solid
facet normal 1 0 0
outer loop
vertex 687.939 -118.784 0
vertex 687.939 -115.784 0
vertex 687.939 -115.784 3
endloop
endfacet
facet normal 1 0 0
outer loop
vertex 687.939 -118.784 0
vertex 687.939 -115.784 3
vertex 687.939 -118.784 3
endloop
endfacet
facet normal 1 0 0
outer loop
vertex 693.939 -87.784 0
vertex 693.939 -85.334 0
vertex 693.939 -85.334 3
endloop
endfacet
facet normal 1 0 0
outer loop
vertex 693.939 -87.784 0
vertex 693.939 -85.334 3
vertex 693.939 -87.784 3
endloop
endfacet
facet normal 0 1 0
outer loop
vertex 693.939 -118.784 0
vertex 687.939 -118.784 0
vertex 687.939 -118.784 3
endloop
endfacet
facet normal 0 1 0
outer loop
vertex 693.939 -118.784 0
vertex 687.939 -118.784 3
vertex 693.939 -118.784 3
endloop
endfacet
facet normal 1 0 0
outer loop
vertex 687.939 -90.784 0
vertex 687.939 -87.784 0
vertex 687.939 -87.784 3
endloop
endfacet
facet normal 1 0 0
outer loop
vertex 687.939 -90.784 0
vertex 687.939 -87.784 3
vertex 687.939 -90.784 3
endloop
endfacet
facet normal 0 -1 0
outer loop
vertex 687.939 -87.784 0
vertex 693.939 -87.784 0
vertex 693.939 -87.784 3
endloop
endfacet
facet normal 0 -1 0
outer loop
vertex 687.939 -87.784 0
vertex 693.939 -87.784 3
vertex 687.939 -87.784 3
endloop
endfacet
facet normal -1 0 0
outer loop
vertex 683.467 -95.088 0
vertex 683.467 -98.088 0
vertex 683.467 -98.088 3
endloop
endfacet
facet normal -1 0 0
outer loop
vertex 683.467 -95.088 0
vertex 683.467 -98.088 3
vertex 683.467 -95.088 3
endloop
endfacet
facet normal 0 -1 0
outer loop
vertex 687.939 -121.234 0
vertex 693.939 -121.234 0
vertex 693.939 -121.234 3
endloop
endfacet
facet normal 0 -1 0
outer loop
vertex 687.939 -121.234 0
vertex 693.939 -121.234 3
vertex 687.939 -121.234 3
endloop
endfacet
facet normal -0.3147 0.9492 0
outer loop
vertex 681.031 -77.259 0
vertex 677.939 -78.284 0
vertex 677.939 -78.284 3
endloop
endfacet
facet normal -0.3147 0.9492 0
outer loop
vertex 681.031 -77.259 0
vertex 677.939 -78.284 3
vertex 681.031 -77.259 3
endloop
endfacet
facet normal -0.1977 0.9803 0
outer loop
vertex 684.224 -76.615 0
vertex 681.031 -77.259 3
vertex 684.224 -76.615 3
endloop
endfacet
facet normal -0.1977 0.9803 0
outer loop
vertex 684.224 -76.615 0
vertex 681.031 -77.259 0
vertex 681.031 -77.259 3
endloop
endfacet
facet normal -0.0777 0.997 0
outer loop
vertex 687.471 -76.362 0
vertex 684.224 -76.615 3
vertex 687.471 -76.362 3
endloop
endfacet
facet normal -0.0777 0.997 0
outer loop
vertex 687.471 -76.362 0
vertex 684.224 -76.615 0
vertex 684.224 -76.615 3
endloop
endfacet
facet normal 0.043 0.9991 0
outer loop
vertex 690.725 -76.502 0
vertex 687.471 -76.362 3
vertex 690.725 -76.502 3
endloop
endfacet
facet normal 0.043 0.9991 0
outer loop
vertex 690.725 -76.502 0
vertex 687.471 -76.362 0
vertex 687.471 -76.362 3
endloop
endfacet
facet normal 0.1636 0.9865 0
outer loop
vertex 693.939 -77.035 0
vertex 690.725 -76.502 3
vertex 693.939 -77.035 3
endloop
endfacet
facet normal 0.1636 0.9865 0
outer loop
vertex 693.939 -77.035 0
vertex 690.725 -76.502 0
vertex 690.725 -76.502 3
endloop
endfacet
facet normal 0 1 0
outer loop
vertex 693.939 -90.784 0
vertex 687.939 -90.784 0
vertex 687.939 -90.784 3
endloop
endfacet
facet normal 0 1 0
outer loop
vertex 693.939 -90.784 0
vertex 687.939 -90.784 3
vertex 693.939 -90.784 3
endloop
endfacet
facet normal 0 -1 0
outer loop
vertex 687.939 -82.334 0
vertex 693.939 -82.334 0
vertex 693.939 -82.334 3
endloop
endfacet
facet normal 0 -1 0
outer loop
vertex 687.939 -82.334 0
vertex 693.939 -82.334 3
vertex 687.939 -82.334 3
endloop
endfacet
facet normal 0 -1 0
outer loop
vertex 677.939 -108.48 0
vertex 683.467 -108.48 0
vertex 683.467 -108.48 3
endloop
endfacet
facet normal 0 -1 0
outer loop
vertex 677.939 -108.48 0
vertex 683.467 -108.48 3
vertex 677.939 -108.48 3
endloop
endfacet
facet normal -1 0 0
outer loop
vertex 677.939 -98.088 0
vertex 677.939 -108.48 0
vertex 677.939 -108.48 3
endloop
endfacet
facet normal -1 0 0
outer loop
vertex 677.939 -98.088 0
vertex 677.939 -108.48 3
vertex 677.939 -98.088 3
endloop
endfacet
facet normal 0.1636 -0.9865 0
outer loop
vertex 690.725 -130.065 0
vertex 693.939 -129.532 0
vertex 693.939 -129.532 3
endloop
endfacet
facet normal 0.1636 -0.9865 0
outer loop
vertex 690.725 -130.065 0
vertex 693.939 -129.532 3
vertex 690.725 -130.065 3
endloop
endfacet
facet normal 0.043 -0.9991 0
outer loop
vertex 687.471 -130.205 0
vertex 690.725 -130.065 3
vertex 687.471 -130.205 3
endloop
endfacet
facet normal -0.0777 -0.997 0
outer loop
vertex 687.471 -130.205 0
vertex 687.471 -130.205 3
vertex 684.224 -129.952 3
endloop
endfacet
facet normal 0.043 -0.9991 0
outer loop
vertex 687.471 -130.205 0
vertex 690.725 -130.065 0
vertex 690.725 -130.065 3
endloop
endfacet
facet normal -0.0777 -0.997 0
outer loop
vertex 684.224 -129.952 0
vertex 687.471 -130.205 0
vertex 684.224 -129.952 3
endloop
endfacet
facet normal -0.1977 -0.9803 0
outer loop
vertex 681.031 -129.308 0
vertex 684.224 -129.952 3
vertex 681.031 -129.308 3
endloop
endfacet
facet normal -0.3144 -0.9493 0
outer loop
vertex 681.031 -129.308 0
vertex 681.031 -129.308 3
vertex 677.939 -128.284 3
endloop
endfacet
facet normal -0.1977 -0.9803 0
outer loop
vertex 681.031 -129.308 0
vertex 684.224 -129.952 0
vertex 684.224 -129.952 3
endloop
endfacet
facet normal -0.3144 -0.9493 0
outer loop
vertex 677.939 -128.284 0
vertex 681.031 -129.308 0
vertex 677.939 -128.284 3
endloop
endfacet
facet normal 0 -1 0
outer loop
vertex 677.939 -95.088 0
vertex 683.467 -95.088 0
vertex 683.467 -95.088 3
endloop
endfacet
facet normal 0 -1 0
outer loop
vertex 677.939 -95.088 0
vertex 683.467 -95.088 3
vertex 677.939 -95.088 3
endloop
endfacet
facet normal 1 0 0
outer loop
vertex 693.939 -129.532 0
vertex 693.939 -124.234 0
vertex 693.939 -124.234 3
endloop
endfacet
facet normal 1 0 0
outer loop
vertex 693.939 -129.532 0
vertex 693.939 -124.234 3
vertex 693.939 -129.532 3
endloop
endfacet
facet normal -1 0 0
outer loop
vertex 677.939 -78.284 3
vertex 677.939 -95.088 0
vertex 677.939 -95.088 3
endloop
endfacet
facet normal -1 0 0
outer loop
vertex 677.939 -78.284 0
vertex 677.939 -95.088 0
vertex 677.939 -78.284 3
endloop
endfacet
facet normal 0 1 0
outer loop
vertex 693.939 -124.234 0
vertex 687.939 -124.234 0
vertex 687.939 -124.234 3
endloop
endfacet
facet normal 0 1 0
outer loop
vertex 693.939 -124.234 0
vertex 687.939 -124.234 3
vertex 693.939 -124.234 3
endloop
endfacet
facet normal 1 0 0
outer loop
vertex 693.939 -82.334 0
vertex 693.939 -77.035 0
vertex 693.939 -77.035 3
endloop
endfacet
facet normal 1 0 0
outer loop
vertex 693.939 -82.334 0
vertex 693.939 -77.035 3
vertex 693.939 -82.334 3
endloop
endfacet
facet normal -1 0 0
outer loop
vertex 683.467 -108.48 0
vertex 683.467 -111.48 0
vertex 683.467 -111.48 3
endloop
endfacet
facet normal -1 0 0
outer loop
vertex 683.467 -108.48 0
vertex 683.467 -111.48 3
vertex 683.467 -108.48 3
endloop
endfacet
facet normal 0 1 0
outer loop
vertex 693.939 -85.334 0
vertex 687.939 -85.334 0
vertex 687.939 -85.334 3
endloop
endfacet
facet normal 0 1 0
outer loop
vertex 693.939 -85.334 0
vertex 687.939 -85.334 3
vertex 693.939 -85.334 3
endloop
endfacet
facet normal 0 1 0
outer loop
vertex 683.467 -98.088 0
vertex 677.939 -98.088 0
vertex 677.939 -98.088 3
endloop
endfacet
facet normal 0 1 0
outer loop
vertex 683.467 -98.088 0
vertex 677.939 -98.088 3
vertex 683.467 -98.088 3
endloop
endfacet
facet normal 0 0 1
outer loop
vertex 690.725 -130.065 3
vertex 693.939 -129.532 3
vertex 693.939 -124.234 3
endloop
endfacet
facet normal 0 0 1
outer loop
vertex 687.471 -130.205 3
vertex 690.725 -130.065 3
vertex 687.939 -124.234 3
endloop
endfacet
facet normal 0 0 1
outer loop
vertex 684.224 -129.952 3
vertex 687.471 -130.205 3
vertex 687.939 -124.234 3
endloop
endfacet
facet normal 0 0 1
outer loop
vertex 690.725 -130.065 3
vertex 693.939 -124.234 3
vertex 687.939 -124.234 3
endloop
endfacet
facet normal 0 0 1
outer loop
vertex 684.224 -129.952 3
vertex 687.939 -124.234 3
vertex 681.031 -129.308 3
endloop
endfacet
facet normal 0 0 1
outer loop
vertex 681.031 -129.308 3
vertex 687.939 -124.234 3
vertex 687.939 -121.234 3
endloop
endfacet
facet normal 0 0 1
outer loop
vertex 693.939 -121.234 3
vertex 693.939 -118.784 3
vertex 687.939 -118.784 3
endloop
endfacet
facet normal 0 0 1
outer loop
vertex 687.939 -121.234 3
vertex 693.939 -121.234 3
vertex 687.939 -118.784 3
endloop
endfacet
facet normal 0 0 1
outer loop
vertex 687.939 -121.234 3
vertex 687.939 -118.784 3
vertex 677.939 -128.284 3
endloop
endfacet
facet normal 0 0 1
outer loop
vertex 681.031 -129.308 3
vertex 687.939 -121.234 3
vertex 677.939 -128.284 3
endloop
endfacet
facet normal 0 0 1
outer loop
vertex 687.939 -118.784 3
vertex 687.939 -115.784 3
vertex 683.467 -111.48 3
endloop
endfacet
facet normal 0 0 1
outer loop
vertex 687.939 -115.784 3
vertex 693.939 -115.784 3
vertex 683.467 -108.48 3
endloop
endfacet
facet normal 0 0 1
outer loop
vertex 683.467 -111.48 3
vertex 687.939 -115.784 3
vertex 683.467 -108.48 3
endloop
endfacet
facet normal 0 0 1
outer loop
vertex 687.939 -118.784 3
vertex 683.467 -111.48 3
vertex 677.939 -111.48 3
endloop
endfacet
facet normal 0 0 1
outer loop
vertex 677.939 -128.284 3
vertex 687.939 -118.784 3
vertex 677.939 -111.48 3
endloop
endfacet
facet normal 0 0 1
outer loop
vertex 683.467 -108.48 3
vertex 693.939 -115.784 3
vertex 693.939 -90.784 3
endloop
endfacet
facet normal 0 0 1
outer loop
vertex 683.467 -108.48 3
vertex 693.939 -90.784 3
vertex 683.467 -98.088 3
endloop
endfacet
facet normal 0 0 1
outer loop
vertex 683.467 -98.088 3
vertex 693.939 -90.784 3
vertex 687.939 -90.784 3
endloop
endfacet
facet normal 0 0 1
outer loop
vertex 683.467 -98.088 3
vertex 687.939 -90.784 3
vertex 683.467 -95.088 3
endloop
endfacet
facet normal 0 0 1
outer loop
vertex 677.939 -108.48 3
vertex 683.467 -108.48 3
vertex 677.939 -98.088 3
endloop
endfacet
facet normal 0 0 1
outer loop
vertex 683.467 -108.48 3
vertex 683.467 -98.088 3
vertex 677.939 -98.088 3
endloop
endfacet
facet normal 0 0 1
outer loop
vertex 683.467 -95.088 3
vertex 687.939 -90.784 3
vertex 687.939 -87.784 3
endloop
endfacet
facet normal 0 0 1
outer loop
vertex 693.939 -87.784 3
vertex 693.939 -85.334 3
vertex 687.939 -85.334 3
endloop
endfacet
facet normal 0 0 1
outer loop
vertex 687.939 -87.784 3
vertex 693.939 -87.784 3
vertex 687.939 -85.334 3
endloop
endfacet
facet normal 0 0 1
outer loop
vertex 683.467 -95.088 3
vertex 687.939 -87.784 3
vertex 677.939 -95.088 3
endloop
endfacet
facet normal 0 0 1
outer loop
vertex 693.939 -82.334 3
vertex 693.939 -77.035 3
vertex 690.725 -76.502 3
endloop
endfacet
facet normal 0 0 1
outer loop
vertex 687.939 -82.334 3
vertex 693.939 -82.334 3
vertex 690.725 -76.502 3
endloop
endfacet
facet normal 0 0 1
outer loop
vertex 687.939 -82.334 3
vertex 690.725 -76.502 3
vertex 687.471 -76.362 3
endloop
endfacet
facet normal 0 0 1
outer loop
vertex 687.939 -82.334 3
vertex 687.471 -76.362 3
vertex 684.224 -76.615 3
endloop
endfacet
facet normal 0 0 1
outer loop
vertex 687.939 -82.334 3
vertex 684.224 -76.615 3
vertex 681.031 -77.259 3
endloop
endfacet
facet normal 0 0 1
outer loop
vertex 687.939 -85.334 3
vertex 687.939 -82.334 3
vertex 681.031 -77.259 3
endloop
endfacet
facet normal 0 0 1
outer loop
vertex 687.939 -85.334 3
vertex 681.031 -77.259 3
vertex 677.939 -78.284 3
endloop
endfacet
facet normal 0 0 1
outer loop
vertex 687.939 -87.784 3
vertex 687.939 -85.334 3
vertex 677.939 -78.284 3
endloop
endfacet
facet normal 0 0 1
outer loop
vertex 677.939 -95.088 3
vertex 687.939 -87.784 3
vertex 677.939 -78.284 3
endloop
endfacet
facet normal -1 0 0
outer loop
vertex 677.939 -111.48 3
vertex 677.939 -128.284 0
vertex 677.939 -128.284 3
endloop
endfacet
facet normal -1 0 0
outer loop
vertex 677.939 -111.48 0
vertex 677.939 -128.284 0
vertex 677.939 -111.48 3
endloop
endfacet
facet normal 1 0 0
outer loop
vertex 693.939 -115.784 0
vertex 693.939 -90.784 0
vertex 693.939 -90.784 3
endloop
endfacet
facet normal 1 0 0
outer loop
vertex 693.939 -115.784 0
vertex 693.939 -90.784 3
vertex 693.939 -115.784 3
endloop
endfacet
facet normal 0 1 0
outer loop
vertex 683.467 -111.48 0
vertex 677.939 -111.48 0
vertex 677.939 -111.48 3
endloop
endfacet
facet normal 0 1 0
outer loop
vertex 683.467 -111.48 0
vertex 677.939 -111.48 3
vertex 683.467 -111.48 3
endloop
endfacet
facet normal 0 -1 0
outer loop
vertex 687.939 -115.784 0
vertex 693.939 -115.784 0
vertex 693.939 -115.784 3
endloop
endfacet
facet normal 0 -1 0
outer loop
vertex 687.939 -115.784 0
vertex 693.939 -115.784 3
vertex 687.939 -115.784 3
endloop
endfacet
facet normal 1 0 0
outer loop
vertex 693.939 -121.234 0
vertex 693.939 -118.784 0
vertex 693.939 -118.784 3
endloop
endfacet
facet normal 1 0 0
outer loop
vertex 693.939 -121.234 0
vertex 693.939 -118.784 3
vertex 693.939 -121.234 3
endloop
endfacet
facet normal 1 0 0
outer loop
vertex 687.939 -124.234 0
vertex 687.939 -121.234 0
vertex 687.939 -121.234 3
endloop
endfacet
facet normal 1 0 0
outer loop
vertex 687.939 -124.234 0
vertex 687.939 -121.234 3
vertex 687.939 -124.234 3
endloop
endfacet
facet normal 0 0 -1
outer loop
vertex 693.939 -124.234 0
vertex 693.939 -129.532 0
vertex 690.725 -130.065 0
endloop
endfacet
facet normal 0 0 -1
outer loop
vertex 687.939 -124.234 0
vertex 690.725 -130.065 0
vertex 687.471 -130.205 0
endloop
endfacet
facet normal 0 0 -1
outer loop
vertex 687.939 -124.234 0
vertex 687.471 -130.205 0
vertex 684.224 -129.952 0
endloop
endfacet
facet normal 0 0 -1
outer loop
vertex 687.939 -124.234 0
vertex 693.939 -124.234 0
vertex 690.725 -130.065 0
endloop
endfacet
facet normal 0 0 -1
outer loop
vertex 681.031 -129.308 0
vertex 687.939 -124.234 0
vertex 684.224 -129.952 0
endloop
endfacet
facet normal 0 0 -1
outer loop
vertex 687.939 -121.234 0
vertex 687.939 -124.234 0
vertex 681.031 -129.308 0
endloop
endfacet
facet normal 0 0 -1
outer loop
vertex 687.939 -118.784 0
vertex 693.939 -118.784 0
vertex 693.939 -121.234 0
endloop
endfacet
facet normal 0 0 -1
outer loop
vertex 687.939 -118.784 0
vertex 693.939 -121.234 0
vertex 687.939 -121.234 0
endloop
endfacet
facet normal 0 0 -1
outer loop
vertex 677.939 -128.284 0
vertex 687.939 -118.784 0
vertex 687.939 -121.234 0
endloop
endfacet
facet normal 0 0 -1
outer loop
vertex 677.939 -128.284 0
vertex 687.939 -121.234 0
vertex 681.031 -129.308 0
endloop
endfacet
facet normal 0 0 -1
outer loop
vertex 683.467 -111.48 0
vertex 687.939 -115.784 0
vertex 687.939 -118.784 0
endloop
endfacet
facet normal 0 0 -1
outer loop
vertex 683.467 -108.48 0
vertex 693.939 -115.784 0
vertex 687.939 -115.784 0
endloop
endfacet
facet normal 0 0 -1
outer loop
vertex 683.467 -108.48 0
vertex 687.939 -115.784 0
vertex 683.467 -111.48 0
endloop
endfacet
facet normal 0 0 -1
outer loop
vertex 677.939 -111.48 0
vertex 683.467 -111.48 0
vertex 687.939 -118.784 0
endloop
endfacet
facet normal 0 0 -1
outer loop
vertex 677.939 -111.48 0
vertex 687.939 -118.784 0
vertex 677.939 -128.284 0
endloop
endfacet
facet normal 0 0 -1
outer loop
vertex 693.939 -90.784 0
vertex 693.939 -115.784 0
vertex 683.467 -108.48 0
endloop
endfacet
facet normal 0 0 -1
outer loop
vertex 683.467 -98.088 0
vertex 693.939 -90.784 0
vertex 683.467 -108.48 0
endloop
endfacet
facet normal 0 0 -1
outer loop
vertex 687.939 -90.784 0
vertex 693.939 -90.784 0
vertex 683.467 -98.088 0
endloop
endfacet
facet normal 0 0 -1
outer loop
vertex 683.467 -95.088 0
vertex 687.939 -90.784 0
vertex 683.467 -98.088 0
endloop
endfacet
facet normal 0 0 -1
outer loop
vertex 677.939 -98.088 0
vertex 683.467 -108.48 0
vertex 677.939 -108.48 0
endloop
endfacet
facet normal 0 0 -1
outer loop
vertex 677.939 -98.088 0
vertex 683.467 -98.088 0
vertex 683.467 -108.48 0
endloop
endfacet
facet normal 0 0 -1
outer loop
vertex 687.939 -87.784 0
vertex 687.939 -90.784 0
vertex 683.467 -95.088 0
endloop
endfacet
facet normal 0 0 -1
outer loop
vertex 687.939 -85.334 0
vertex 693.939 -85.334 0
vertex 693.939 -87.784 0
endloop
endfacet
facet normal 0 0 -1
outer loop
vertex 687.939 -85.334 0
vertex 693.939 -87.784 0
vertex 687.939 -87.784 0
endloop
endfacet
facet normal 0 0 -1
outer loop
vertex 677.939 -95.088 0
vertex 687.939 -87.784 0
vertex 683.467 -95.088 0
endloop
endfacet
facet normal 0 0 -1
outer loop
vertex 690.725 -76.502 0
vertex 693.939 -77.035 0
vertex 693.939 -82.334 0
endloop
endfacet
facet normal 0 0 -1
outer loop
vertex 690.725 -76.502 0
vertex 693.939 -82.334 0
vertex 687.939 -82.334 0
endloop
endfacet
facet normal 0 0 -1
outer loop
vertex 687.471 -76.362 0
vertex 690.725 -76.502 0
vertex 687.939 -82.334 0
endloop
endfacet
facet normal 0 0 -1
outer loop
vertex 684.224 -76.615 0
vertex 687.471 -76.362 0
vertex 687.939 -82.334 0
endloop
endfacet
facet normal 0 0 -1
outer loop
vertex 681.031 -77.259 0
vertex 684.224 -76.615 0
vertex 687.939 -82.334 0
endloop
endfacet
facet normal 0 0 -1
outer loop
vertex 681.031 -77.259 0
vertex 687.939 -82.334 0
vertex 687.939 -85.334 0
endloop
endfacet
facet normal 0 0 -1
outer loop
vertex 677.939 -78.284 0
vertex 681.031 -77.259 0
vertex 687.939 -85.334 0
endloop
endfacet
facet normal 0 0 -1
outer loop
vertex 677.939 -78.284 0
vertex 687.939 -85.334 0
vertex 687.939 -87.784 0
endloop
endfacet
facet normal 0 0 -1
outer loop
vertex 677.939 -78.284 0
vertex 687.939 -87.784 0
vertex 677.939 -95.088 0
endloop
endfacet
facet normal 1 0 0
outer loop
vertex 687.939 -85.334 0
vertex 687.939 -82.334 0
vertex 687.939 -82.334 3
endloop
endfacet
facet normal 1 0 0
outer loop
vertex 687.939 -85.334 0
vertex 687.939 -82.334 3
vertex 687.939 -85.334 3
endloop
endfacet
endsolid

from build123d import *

# Parameters (mm, degrees)
BASE_EXTRUDE_DEPTH = 3


with BuildPart() as part:
    # Sketch1 → Base-Extrude (new body)
    with BuildSketch(Plane.XY):
        with BuildLine():
            Line((693.938729313, -90.783662266), (693.938729313, -115.783662266))
            Line((693.938729313, -115.783662266), (687.938729313, -115.783662266))
            Line((687.938729313, -115.783662266), (687.938729313, -118.783662266))
            Line((687.938729313, -118.783662266), (693.938729313, -118.783662266))
            Line((693.938729313, -118.783662266), (693.938729313, -121.233634181))
            Line((693.938729313, -121.233634181), (687.938729313, -121.233634181))
            Line((687.938729313, -121.233634181), (687.938729313, -124.233634181))
            Line((687.938729313, -124.233634181), (693.938729313, -124.233634181))
            Line((693.938729313, -124.233634181), (693.938729313, -129.532471762))
            ThreePointArc((693.938729313, -129.532471762), (685.843524958, -130.127844479), (677.938729313, -128.283662266))
            Line((677.938729313, -128.283662266), (677.938729313, -111.479521793))
            Line((677.938729313, -111.479521793), (683.467463006, -111.479521793))
            Line((683.467463006, -111.479521793), (683.467463006, -108.479521793))
            Line((683.467463006, -108.479521793), (677.938729313, -108.479521793))
            Line((677.938729313, -108.479521793), (677.938729313, -98.087802738))
            Line((677.938729313, -98.087802738), (683.467463006, -98.087802738))
            Line((683.467463006, -98.087802738), (683.467463006, -95.087802738))
            Line((683.467463006, -95.087802738), (677.938729313, -95.087802738))
            Line((677.938729313, -95.087802738), (677.938729313, -78.283662266))
            ThreePointArc((677.938729313, -78.283662266), (685.843524958, -76.439480052), (693.938729313, -77.034852769))
            Line((693.938729313, -77.034852769), (693.938729313, -82.33369035))
            Line((693.938729313, -82.33369035), (687.938729313, -82.33369035))
            Line((687.938729313, -82.33369035), (687.938729313, -85.33369035))
            Line((687.938729313, -85.33369035), (693.938729313, -85.33369035))
            Line((693.938729313, -85.33369035), (693.938729313, -87.783662266))
            Line((693.938729313, -87.783662266), (687.938729313, -87.783662266))
            Line((687.938729313, -87.783662266), (687.938729313, -90.783662266))
            Line((687.938729313, -90.783662266), (693.938729313, -90.783662266))
        make_face()
    extrude(amount=BASE_EXTRUDE_DEPTH)


solid = part.part
